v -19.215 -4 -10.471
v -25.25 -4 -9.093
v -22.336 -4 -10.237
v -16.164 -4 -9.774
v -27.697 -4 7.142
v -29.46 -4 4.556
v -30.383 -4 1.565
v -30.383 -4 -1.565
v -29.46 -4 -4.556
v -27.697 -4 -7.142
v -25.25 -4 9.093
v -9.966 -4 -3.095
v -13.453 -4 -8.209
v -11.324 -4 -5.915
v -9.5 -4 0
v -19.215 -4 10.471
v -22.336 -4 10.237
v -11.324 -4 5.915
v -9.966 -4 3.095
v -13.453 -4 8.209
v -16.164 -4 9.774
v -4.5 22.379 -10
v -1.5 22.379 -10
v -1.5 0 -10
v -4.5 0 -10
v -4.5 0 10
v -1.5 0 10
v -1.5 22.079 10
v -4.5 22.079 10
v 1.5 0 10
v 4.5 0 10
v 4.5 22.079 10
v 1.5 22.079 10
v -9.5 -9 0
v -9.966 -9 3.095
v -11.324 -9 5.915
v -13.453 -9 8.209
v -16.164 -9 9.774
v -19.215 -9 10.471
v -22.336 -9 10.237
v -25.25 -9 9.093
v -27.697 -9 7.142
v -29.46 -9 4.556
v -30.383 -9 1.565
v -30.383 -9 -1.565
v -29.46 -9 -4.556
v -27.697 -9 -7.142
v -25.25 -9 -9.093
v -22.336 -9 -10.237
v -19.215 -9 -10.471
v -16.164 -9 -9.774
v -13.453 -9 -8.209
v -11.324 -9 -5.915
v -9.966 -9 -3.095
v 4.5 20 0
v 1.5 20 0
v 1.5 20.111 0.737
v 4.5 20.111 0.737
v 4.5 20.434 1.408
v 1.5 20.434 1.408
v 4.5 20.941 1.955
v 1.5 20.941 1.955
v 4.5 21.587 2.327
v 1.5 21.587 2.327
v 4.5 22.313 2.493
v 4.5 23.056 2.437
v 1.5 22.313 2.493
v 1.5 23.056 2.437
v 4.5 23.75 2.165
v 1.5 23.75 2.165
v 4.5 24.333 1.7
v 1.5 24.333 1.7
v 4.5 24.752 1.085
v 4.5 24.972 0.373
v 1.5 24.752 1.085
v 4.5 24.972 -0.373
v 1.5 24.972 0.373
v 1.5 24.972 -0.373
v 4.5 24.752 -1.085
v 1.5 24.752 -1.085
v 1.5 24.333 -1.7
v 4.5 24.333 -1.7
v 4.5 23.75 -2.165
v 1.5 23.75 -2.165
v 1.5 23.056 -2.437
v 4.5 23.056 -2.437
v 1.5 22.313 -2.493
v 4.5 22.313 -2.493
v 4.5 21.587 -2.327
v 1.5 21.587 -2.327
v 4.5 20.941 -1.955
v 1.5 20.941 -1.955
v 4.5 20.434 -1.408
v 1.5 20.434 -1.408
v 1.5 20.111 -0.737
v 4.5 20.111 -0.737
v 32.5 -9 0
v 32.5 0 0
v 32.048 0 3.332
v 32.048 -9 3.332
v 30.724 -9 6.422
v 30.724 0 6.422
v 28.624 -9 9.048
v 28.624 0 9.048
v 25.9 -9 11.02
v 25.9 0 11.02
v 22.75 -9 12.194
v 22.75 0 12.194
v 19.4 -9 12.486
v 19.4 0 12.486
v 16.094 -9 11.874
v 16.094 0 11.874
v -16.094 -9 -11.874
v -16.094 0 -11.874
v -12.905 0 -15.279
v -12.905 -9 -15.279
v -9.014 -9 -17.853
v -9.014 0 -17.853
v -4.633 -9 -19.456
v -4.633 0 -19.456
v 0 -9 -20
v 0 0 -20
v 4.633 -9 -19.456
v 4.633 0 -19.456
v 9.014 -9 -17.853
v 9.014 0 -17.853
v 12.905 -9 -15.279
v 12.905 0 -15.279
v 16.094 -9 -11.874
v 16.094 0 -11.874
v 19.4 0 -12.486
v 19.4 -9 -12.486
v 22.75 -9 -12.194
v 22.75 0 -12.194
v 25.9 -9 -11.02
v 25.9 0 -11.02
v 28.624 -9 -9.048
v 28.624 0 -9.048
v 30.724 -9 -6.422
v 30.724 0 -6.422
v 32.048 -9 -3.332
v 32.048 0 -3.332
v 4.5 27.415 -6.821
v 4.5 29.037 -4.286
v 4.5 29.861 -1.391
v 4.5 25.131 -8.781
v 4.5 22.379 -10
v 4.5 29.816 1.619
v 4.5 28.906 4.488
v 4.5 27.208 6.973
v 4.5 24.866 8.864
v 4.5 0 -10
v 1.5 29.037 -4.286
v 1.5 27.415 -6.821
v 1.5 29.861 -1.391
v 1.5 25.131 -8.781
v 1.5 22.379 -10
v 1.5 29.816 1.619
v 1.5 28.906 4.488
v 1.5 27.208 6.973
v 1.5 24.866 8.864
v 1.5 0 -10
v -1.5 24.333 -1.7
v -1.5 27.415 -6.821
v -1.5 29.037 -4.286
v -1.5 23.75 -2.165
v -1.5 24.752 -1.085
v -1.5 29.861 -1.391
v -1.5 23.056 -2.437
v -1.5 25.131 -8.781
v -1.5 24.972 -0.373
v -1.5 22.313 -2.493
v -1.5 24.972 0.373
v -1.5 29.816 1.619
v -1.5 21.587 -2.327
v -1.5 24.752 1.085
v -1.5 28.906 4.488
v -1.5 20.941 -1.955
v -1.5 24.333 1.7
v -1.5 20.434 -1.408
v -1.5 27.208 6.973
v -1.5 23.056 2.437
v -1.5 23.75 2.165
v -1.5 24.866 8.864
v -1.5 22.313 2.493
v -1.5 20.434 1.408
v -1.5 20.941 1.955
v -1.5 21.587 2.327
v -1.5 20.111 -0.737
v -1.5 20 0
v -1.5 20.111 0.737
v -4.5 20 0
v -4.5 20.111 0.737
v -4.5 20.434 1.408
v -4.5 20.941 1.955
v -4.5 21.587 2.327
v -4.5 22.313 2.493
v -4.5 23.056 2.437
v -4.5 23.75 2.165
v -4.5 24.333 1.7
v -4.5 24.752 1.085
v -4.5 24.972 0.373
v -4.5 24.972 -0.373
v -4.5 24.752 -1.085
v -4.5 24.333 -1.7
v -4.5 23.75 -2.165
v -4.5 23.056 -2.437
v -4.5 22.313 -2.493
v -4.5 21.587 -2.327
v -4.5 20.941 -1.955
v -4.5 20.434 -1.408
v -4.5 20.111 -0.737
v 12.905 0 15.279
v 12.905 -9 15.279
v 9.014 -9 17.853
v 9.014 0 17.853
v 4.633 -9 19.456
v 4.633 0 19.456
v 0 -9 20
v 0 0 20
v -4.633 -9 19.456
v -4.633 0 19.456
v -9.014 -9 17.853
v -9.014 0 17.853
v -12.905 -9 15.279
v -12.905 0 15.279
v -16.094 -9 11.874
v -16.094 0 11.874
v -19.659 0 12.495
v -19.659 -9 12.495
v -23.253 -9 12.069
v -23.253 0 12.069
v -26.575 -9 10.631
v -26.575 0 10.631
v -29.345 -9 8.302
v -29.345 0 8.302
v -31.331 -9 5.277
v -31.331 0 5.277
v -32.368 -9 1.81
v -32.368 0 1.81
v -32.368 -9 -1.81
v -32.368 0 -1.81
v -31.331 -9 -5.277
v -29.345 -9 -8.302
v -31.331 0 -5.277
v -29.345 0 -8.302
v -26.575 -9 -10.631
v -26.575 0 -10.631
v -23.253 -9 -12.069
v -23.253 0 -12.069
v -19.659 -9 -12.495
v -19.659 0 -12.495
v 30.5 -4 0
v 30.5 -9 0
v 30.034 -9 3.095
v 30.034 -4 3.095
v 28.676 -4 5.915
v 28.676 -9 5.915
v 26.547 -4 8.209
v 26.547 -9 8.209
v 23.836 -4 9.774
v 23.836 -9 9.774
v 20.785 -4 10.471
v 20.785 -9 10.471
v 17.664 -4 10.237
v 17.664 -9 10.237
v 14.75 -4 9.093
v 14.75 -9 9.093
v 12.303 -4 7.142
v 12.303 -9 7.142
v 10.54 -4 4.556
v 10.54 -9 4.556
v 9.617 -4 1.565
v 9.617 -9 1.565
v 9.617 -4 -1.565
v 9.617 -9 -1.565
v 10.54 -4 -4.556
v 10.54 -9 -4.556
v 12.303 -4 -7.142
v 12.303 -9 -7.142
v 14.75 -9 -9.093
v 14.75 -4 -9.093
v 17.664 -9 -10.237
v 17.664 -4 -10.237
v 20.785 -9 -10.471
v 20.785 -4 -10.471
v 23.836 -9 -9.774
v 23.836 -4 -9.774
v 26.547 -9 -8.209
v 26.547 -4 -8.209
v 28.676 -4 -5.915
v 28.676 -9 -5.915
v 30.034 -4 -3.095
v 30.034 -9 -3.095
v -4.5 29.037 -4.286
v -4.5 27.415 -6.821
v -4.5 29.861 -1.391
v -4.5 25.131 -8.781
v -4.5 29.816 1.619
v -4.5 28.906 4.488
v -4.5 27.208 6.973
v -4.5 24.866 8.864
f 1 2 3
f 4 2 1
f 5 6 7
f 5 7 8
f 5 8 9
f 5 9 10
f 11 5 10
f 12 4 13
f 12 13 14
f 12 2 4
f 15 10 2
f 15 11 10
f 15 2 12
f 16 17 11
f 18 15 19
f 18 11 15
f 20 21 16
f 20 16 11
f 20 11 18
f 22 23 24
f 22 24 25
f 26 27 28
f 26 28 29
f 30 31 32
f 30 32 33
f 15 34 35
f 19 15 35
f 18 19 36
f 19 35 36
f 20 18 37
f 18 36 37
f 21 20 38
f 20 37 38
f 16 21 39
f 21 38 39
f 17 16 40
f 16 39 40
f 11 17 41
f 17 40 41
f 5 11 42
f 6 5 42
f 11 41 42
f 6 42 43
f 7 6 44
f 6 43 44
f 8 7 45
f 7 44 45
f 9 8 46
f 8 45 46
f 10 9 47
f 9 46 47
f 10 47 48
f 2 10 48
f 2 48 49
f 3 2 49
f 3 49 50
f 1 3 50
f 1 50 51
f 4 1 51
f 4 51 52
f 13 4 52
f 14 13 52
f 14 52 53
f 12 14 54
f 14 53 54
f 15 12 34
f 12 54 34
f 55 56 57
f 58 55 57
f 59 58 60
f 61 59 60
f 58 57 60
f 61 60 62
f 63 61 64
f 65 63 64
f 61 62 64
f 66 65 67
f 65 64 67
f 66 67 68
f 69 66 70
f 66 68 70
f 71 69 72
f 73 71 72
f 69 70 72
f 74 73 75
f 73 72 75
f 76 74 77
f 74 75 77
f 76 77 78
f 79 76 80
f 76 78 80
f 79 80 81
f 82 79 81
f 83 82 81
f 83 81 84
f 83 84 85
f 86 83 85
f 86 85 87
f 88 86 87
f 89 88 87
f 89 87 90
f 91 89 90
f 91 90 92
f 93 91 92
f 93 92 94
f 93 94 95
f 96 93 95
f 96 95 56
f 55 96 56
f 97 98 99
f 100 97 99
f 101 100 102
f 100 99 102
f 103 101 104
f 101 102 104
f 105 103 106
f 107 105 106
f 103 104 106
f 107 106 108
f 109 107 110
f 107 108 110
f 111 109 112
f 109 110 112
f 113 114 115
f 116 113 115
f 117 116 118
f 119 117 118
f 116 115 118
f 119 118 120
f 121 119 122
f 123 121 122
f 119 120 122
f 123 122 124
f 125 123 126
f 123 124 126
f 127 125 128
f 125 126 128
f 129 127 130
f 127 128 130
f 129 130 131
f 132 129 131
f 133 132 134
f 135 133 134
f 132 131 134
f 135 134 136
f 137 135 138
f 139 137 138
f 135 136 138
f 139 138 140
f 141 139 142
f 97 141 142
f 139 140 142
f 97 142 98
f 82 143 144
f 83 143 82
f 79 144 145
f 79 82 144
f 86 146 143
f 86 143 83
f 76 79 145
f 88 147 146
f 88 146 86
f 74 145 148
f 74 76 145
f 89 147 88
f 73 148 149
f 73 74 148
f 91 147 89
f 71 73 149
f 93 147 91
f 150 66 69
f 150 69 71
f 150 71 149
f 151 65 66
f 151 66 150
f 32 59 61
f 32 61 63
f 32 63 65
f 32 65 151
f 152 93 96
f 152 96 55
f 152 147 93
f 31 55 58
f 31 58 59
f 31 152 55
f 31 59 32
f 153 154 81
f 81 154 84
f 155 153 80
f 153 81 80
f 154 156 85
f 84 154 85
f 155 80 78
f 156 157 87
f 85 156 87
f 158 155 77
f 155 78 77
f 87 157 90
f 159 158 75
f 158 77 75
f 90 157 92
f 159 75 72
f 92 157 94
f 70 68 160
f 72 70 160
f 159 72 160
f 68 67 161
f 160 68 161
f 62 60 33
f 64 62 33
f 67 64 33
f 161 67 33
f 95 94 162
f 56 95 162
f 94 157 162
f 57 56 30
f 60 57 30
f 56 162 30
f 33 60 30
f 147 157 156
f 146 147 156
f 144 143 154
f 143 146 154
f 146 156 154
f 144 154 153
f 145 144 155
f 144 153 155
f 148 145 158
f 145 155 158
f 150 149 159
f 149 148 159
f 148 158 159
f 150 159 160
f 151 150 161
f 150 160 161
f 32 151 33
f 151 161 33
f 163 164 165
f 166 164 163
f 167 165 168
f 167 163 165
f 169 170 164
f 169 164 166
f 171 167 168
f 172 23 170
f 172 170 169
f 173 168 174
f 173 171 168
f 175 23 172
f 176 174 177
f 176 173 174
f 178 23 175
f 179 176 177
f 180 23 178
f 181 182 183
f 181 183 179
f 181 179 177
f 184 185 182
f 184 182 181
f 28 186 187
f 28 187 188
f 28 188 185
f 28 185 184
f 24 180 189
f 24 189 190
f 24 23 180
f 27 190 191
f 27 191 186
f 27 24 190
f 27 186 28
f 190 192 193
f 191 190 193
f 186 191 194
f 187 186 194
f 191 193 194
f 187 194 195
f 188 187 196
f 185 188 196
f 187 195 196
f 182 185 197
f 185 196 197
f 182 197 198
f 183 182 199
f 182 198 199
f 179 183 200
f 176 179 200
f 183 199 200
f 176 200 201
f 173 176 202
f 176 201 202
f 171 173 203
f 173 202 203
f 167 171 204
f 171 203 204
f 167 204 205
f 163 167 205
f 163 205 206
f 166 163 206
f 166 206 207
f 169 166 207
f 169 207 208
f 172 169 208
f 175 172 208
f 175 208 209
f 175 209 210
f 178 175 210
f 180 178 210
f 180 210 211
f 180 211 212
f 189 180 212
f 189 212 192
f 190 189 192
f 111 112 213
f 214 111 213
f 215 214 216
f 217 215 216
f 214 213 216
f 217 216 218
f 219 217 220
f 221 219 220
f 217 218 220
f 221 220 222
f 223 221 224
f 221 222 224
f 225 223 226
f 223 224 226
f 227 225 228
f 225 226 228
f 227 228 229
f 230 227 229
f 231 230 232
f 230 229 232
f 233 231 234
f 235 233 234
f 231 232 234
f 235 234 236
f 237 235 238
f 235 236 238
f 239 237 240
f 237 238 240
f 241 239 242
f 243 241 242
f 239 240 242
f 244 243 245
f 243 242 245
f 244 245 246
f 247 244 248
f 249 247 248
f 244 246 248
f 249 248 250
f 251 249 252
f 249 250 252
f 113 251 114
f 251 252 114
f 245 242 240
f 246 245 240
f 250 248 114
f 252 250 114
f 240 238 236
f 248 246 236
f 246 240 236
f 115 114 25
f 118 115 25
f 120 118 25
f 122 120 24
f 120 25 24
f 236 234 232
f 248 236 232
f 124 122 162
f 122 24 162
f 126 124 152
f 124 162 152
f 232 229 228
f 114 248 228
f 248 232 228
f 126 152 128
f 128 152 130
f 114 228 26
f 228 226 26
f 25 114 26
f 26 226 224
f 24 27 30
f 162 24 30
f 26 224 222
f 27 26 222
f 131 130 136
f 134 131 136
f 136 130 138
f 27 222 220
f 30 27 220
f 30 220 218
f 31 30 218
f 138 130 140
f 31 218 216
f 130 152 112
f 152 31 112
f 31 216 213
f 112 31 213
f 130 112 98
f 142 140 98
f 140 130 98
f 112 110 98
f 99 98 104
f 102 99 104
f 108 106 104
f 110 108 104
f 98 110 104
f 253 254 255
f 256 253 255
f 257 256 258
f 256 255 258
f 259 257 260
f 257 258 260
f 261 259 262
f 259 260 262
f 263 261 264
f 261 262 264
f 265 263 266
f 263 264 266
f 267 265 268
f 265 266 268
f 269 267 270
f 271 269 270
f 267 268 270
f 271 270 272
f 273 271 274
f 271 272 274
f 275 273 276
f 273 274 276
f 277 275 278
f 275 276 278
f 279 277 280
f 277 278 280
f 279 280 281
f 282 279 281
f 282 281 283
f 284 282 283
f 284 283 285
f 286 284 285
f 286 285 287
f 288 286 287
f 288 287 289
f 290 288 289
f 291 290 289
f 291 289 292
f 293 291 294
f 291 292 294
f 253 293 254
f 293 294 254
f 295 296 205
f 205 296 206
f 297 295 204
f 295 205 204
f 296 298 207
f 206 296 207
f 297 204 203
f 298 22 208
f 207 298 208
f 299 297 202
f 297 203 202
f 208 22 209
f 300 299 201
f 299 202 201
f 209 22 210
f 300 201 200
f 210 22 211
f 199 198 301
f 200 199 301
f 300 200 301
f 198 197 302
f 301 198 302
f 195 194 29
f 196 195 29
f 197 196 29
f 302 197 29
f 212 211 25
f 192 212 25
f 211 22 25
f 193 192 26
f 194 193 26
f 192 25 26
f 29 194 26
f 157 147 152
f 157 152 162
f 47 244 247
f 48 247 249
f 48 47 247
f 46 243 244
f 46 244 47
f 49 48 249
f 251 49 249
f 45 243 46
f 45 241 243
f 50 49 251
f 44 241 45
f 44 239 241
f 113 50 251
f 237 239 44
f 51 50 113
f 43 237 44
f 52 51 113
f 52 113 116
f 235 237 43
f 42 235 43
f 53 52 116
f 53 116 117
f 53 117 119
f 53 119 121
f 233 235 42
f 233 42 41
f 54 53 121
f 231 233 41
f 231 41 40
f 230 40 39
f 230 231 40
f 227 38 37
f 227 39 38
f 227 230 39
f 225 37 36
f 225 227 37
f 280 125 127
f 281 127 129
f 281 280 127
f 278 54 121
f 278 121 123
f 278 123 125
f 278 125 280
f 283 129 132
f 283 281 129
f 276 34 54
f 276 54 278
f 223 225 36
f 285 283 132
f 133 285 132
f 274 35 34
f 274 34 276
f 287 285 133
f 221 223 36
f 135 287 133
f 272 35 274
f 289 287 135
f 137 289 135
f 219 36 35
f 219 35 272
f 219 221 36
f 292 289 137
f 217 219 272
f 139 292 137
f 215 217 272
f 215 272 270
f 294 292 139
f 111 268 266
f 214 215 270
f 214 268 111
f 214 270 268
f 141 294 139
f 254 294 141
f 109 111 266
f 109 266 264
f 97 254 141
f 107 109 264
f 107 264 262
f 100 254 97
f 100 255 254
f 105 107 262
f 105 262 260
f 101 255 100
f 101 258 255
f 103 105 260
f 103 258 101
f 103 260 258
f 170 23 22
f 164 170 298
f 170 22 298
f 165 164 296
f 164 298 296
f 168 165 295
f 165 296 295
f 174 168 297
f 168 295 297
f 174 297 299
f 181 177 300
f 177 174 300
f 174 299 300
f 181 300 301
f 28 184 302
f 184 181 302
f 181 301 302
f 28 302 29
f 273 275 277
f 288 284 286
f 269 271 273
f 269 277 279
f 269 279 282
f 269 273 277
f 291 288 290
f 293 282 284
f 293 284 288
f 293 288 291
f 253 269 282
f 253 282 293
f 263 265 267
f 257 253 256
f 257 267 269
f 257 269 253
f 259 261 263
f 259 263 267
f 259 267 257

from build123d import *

# Parameters (mm, degrees)
F1_DEPTH = 9
F2_W     = 3
F2_H     = 20
F3_DEPTH = 30
F4_R     = 2.5
F5_DEPTH = 10
F7_DEPTH = 10
F8_R     = 10.5
F9_DEPTH = 5


with BuildPart() as f1:
    # F0 (on Front) → F1 (new body)
    with BuildSketch(Plane.XZ):
        with BuildLine():
            ThreePointArc((16.09375, -11.873971995), (18.998355192, -6.25), (20, 0))
            ThreePointArc((20, 0), (18.998355192, 6.25), (16.09375, 11.873971995))
            ThreePointArc((16.09375, 11.873971995), (7.5, 0), (16.09375, -11.873971995))
        make_face()
        with BuildLine():
            ThreePointArc((16.09375, 11.873971995), (18.998355192, 6.25), (20, 0))
            ThreePointArc((20, 0), (18.998355192, -6.25), (16.09375, -11.873971995))
            ThreePointArc((16.09375, -11.873971995), (27.3287746247, -10.1261573413), (32.5, 0))
            ThreePointArc((32.5, 0), (27.3287746247, 10.1261573413), (16.09375, 11.873971995))
        make_face()
        with BuildLine():
            ThreePointArc((16.09375, -11.873971995), (7.5, 0), (16.09375, 11.873971995))
            ThreePointArc((16.09375, 11.873971995), (0, 20), (-16.09375, 11.873971995))
            ThreePointArc((-16.09375, 11.873971995), (-9.8738426587, 7.3287746247), (-7.5, 0))
            ThreePointArc((-7.5, 0), (-9.8738426587, -7.3287746247), (-16.09375, -11.873971995))
            ThreePointArc((-16.09375, -11.873971995), (0, -20), (16.09375, -11.873971995))
        make_face()
        with BuildLine():
            ThreePointArc((-7.5, 0), (-9.8738426587, 7.3287746247), (-16.09375, 11.873971995))
            ThreePointArc((-16.09375, 11.873971995), (-20, 0), (-16.09375, -11.873971995))
            ThreePointArc((-16.09375, -11.873971995), (-9.8738426587, -7.3287746247), (-7.5, 0))
        make_face()
        with BuildLine():
            ThreePointArc((-16.09375, -11.873971995), (-20, 0), (-16.09375, 11.873971995))
            ThreePointArc((-16.09375, 11.873971995), (-32.5, 0), (-16.09375, -11.873971995))
        make_face()
    extrude(amount=F1_DEPTH)

    # F2 (on face) → F3 (join)
    with BuildSketch(Plane(origin=(0, 0, 0), x_dir=(-1, 0, 0), z_dir=(0, 1, 0))):
        with Locations((-3, 0)):
            Rectangle(F2_W, F2_H)
        with Locations((3, 0)):
            Rectangle(F2_W, F2_H)
    extrude(amount=F3_DEPTH)

    # F4 (on face) → F5 (cut)
    with BuildSketch(Plane(origin=(-4.5, 0, 0), x_dir=(0, -1, 0), z_dir=(-1, 0, 0))):
        with Locations((-22.5, 0)):
            Circle(F4_R)
    extrude(amount=-F5_DEPTH, mode=Mode.SUBTRACT)

    # F6 (on face) → F7 (cut)
    with BuildSketch(Plane(origin=(-4.5, 0, 0), x_dir=(0, -1, 0), z_dir=(-1, 0, 0))):
        with BuildLine():
            ThreePointArc((-22.3790090531, -10), (-29.9486686635, 0.115669367), (-22.0793280751, 10))
            Line((-22.0793280751, 10), (-30, 10))
            Line((-30, 10), (-30, -10))
            Line((-30, -10), (-22.3790090531, -10))
        make_face()
    extrude(amount=-F7_DEPTH, mode=Mode.SUBTRACT)

    # F8 (on face) → F9 (cut)
    with BuildSketch(Plane.XZ.offset(9)):
        with Locations((-20, 0)):
            Circle(F8_R)
        with Locations((20, 0)):
            Circle(F8_R)
    extrude(amount=-F9_DEPTH, mode=Mode.SUBTRACT)


solid = f1.part
